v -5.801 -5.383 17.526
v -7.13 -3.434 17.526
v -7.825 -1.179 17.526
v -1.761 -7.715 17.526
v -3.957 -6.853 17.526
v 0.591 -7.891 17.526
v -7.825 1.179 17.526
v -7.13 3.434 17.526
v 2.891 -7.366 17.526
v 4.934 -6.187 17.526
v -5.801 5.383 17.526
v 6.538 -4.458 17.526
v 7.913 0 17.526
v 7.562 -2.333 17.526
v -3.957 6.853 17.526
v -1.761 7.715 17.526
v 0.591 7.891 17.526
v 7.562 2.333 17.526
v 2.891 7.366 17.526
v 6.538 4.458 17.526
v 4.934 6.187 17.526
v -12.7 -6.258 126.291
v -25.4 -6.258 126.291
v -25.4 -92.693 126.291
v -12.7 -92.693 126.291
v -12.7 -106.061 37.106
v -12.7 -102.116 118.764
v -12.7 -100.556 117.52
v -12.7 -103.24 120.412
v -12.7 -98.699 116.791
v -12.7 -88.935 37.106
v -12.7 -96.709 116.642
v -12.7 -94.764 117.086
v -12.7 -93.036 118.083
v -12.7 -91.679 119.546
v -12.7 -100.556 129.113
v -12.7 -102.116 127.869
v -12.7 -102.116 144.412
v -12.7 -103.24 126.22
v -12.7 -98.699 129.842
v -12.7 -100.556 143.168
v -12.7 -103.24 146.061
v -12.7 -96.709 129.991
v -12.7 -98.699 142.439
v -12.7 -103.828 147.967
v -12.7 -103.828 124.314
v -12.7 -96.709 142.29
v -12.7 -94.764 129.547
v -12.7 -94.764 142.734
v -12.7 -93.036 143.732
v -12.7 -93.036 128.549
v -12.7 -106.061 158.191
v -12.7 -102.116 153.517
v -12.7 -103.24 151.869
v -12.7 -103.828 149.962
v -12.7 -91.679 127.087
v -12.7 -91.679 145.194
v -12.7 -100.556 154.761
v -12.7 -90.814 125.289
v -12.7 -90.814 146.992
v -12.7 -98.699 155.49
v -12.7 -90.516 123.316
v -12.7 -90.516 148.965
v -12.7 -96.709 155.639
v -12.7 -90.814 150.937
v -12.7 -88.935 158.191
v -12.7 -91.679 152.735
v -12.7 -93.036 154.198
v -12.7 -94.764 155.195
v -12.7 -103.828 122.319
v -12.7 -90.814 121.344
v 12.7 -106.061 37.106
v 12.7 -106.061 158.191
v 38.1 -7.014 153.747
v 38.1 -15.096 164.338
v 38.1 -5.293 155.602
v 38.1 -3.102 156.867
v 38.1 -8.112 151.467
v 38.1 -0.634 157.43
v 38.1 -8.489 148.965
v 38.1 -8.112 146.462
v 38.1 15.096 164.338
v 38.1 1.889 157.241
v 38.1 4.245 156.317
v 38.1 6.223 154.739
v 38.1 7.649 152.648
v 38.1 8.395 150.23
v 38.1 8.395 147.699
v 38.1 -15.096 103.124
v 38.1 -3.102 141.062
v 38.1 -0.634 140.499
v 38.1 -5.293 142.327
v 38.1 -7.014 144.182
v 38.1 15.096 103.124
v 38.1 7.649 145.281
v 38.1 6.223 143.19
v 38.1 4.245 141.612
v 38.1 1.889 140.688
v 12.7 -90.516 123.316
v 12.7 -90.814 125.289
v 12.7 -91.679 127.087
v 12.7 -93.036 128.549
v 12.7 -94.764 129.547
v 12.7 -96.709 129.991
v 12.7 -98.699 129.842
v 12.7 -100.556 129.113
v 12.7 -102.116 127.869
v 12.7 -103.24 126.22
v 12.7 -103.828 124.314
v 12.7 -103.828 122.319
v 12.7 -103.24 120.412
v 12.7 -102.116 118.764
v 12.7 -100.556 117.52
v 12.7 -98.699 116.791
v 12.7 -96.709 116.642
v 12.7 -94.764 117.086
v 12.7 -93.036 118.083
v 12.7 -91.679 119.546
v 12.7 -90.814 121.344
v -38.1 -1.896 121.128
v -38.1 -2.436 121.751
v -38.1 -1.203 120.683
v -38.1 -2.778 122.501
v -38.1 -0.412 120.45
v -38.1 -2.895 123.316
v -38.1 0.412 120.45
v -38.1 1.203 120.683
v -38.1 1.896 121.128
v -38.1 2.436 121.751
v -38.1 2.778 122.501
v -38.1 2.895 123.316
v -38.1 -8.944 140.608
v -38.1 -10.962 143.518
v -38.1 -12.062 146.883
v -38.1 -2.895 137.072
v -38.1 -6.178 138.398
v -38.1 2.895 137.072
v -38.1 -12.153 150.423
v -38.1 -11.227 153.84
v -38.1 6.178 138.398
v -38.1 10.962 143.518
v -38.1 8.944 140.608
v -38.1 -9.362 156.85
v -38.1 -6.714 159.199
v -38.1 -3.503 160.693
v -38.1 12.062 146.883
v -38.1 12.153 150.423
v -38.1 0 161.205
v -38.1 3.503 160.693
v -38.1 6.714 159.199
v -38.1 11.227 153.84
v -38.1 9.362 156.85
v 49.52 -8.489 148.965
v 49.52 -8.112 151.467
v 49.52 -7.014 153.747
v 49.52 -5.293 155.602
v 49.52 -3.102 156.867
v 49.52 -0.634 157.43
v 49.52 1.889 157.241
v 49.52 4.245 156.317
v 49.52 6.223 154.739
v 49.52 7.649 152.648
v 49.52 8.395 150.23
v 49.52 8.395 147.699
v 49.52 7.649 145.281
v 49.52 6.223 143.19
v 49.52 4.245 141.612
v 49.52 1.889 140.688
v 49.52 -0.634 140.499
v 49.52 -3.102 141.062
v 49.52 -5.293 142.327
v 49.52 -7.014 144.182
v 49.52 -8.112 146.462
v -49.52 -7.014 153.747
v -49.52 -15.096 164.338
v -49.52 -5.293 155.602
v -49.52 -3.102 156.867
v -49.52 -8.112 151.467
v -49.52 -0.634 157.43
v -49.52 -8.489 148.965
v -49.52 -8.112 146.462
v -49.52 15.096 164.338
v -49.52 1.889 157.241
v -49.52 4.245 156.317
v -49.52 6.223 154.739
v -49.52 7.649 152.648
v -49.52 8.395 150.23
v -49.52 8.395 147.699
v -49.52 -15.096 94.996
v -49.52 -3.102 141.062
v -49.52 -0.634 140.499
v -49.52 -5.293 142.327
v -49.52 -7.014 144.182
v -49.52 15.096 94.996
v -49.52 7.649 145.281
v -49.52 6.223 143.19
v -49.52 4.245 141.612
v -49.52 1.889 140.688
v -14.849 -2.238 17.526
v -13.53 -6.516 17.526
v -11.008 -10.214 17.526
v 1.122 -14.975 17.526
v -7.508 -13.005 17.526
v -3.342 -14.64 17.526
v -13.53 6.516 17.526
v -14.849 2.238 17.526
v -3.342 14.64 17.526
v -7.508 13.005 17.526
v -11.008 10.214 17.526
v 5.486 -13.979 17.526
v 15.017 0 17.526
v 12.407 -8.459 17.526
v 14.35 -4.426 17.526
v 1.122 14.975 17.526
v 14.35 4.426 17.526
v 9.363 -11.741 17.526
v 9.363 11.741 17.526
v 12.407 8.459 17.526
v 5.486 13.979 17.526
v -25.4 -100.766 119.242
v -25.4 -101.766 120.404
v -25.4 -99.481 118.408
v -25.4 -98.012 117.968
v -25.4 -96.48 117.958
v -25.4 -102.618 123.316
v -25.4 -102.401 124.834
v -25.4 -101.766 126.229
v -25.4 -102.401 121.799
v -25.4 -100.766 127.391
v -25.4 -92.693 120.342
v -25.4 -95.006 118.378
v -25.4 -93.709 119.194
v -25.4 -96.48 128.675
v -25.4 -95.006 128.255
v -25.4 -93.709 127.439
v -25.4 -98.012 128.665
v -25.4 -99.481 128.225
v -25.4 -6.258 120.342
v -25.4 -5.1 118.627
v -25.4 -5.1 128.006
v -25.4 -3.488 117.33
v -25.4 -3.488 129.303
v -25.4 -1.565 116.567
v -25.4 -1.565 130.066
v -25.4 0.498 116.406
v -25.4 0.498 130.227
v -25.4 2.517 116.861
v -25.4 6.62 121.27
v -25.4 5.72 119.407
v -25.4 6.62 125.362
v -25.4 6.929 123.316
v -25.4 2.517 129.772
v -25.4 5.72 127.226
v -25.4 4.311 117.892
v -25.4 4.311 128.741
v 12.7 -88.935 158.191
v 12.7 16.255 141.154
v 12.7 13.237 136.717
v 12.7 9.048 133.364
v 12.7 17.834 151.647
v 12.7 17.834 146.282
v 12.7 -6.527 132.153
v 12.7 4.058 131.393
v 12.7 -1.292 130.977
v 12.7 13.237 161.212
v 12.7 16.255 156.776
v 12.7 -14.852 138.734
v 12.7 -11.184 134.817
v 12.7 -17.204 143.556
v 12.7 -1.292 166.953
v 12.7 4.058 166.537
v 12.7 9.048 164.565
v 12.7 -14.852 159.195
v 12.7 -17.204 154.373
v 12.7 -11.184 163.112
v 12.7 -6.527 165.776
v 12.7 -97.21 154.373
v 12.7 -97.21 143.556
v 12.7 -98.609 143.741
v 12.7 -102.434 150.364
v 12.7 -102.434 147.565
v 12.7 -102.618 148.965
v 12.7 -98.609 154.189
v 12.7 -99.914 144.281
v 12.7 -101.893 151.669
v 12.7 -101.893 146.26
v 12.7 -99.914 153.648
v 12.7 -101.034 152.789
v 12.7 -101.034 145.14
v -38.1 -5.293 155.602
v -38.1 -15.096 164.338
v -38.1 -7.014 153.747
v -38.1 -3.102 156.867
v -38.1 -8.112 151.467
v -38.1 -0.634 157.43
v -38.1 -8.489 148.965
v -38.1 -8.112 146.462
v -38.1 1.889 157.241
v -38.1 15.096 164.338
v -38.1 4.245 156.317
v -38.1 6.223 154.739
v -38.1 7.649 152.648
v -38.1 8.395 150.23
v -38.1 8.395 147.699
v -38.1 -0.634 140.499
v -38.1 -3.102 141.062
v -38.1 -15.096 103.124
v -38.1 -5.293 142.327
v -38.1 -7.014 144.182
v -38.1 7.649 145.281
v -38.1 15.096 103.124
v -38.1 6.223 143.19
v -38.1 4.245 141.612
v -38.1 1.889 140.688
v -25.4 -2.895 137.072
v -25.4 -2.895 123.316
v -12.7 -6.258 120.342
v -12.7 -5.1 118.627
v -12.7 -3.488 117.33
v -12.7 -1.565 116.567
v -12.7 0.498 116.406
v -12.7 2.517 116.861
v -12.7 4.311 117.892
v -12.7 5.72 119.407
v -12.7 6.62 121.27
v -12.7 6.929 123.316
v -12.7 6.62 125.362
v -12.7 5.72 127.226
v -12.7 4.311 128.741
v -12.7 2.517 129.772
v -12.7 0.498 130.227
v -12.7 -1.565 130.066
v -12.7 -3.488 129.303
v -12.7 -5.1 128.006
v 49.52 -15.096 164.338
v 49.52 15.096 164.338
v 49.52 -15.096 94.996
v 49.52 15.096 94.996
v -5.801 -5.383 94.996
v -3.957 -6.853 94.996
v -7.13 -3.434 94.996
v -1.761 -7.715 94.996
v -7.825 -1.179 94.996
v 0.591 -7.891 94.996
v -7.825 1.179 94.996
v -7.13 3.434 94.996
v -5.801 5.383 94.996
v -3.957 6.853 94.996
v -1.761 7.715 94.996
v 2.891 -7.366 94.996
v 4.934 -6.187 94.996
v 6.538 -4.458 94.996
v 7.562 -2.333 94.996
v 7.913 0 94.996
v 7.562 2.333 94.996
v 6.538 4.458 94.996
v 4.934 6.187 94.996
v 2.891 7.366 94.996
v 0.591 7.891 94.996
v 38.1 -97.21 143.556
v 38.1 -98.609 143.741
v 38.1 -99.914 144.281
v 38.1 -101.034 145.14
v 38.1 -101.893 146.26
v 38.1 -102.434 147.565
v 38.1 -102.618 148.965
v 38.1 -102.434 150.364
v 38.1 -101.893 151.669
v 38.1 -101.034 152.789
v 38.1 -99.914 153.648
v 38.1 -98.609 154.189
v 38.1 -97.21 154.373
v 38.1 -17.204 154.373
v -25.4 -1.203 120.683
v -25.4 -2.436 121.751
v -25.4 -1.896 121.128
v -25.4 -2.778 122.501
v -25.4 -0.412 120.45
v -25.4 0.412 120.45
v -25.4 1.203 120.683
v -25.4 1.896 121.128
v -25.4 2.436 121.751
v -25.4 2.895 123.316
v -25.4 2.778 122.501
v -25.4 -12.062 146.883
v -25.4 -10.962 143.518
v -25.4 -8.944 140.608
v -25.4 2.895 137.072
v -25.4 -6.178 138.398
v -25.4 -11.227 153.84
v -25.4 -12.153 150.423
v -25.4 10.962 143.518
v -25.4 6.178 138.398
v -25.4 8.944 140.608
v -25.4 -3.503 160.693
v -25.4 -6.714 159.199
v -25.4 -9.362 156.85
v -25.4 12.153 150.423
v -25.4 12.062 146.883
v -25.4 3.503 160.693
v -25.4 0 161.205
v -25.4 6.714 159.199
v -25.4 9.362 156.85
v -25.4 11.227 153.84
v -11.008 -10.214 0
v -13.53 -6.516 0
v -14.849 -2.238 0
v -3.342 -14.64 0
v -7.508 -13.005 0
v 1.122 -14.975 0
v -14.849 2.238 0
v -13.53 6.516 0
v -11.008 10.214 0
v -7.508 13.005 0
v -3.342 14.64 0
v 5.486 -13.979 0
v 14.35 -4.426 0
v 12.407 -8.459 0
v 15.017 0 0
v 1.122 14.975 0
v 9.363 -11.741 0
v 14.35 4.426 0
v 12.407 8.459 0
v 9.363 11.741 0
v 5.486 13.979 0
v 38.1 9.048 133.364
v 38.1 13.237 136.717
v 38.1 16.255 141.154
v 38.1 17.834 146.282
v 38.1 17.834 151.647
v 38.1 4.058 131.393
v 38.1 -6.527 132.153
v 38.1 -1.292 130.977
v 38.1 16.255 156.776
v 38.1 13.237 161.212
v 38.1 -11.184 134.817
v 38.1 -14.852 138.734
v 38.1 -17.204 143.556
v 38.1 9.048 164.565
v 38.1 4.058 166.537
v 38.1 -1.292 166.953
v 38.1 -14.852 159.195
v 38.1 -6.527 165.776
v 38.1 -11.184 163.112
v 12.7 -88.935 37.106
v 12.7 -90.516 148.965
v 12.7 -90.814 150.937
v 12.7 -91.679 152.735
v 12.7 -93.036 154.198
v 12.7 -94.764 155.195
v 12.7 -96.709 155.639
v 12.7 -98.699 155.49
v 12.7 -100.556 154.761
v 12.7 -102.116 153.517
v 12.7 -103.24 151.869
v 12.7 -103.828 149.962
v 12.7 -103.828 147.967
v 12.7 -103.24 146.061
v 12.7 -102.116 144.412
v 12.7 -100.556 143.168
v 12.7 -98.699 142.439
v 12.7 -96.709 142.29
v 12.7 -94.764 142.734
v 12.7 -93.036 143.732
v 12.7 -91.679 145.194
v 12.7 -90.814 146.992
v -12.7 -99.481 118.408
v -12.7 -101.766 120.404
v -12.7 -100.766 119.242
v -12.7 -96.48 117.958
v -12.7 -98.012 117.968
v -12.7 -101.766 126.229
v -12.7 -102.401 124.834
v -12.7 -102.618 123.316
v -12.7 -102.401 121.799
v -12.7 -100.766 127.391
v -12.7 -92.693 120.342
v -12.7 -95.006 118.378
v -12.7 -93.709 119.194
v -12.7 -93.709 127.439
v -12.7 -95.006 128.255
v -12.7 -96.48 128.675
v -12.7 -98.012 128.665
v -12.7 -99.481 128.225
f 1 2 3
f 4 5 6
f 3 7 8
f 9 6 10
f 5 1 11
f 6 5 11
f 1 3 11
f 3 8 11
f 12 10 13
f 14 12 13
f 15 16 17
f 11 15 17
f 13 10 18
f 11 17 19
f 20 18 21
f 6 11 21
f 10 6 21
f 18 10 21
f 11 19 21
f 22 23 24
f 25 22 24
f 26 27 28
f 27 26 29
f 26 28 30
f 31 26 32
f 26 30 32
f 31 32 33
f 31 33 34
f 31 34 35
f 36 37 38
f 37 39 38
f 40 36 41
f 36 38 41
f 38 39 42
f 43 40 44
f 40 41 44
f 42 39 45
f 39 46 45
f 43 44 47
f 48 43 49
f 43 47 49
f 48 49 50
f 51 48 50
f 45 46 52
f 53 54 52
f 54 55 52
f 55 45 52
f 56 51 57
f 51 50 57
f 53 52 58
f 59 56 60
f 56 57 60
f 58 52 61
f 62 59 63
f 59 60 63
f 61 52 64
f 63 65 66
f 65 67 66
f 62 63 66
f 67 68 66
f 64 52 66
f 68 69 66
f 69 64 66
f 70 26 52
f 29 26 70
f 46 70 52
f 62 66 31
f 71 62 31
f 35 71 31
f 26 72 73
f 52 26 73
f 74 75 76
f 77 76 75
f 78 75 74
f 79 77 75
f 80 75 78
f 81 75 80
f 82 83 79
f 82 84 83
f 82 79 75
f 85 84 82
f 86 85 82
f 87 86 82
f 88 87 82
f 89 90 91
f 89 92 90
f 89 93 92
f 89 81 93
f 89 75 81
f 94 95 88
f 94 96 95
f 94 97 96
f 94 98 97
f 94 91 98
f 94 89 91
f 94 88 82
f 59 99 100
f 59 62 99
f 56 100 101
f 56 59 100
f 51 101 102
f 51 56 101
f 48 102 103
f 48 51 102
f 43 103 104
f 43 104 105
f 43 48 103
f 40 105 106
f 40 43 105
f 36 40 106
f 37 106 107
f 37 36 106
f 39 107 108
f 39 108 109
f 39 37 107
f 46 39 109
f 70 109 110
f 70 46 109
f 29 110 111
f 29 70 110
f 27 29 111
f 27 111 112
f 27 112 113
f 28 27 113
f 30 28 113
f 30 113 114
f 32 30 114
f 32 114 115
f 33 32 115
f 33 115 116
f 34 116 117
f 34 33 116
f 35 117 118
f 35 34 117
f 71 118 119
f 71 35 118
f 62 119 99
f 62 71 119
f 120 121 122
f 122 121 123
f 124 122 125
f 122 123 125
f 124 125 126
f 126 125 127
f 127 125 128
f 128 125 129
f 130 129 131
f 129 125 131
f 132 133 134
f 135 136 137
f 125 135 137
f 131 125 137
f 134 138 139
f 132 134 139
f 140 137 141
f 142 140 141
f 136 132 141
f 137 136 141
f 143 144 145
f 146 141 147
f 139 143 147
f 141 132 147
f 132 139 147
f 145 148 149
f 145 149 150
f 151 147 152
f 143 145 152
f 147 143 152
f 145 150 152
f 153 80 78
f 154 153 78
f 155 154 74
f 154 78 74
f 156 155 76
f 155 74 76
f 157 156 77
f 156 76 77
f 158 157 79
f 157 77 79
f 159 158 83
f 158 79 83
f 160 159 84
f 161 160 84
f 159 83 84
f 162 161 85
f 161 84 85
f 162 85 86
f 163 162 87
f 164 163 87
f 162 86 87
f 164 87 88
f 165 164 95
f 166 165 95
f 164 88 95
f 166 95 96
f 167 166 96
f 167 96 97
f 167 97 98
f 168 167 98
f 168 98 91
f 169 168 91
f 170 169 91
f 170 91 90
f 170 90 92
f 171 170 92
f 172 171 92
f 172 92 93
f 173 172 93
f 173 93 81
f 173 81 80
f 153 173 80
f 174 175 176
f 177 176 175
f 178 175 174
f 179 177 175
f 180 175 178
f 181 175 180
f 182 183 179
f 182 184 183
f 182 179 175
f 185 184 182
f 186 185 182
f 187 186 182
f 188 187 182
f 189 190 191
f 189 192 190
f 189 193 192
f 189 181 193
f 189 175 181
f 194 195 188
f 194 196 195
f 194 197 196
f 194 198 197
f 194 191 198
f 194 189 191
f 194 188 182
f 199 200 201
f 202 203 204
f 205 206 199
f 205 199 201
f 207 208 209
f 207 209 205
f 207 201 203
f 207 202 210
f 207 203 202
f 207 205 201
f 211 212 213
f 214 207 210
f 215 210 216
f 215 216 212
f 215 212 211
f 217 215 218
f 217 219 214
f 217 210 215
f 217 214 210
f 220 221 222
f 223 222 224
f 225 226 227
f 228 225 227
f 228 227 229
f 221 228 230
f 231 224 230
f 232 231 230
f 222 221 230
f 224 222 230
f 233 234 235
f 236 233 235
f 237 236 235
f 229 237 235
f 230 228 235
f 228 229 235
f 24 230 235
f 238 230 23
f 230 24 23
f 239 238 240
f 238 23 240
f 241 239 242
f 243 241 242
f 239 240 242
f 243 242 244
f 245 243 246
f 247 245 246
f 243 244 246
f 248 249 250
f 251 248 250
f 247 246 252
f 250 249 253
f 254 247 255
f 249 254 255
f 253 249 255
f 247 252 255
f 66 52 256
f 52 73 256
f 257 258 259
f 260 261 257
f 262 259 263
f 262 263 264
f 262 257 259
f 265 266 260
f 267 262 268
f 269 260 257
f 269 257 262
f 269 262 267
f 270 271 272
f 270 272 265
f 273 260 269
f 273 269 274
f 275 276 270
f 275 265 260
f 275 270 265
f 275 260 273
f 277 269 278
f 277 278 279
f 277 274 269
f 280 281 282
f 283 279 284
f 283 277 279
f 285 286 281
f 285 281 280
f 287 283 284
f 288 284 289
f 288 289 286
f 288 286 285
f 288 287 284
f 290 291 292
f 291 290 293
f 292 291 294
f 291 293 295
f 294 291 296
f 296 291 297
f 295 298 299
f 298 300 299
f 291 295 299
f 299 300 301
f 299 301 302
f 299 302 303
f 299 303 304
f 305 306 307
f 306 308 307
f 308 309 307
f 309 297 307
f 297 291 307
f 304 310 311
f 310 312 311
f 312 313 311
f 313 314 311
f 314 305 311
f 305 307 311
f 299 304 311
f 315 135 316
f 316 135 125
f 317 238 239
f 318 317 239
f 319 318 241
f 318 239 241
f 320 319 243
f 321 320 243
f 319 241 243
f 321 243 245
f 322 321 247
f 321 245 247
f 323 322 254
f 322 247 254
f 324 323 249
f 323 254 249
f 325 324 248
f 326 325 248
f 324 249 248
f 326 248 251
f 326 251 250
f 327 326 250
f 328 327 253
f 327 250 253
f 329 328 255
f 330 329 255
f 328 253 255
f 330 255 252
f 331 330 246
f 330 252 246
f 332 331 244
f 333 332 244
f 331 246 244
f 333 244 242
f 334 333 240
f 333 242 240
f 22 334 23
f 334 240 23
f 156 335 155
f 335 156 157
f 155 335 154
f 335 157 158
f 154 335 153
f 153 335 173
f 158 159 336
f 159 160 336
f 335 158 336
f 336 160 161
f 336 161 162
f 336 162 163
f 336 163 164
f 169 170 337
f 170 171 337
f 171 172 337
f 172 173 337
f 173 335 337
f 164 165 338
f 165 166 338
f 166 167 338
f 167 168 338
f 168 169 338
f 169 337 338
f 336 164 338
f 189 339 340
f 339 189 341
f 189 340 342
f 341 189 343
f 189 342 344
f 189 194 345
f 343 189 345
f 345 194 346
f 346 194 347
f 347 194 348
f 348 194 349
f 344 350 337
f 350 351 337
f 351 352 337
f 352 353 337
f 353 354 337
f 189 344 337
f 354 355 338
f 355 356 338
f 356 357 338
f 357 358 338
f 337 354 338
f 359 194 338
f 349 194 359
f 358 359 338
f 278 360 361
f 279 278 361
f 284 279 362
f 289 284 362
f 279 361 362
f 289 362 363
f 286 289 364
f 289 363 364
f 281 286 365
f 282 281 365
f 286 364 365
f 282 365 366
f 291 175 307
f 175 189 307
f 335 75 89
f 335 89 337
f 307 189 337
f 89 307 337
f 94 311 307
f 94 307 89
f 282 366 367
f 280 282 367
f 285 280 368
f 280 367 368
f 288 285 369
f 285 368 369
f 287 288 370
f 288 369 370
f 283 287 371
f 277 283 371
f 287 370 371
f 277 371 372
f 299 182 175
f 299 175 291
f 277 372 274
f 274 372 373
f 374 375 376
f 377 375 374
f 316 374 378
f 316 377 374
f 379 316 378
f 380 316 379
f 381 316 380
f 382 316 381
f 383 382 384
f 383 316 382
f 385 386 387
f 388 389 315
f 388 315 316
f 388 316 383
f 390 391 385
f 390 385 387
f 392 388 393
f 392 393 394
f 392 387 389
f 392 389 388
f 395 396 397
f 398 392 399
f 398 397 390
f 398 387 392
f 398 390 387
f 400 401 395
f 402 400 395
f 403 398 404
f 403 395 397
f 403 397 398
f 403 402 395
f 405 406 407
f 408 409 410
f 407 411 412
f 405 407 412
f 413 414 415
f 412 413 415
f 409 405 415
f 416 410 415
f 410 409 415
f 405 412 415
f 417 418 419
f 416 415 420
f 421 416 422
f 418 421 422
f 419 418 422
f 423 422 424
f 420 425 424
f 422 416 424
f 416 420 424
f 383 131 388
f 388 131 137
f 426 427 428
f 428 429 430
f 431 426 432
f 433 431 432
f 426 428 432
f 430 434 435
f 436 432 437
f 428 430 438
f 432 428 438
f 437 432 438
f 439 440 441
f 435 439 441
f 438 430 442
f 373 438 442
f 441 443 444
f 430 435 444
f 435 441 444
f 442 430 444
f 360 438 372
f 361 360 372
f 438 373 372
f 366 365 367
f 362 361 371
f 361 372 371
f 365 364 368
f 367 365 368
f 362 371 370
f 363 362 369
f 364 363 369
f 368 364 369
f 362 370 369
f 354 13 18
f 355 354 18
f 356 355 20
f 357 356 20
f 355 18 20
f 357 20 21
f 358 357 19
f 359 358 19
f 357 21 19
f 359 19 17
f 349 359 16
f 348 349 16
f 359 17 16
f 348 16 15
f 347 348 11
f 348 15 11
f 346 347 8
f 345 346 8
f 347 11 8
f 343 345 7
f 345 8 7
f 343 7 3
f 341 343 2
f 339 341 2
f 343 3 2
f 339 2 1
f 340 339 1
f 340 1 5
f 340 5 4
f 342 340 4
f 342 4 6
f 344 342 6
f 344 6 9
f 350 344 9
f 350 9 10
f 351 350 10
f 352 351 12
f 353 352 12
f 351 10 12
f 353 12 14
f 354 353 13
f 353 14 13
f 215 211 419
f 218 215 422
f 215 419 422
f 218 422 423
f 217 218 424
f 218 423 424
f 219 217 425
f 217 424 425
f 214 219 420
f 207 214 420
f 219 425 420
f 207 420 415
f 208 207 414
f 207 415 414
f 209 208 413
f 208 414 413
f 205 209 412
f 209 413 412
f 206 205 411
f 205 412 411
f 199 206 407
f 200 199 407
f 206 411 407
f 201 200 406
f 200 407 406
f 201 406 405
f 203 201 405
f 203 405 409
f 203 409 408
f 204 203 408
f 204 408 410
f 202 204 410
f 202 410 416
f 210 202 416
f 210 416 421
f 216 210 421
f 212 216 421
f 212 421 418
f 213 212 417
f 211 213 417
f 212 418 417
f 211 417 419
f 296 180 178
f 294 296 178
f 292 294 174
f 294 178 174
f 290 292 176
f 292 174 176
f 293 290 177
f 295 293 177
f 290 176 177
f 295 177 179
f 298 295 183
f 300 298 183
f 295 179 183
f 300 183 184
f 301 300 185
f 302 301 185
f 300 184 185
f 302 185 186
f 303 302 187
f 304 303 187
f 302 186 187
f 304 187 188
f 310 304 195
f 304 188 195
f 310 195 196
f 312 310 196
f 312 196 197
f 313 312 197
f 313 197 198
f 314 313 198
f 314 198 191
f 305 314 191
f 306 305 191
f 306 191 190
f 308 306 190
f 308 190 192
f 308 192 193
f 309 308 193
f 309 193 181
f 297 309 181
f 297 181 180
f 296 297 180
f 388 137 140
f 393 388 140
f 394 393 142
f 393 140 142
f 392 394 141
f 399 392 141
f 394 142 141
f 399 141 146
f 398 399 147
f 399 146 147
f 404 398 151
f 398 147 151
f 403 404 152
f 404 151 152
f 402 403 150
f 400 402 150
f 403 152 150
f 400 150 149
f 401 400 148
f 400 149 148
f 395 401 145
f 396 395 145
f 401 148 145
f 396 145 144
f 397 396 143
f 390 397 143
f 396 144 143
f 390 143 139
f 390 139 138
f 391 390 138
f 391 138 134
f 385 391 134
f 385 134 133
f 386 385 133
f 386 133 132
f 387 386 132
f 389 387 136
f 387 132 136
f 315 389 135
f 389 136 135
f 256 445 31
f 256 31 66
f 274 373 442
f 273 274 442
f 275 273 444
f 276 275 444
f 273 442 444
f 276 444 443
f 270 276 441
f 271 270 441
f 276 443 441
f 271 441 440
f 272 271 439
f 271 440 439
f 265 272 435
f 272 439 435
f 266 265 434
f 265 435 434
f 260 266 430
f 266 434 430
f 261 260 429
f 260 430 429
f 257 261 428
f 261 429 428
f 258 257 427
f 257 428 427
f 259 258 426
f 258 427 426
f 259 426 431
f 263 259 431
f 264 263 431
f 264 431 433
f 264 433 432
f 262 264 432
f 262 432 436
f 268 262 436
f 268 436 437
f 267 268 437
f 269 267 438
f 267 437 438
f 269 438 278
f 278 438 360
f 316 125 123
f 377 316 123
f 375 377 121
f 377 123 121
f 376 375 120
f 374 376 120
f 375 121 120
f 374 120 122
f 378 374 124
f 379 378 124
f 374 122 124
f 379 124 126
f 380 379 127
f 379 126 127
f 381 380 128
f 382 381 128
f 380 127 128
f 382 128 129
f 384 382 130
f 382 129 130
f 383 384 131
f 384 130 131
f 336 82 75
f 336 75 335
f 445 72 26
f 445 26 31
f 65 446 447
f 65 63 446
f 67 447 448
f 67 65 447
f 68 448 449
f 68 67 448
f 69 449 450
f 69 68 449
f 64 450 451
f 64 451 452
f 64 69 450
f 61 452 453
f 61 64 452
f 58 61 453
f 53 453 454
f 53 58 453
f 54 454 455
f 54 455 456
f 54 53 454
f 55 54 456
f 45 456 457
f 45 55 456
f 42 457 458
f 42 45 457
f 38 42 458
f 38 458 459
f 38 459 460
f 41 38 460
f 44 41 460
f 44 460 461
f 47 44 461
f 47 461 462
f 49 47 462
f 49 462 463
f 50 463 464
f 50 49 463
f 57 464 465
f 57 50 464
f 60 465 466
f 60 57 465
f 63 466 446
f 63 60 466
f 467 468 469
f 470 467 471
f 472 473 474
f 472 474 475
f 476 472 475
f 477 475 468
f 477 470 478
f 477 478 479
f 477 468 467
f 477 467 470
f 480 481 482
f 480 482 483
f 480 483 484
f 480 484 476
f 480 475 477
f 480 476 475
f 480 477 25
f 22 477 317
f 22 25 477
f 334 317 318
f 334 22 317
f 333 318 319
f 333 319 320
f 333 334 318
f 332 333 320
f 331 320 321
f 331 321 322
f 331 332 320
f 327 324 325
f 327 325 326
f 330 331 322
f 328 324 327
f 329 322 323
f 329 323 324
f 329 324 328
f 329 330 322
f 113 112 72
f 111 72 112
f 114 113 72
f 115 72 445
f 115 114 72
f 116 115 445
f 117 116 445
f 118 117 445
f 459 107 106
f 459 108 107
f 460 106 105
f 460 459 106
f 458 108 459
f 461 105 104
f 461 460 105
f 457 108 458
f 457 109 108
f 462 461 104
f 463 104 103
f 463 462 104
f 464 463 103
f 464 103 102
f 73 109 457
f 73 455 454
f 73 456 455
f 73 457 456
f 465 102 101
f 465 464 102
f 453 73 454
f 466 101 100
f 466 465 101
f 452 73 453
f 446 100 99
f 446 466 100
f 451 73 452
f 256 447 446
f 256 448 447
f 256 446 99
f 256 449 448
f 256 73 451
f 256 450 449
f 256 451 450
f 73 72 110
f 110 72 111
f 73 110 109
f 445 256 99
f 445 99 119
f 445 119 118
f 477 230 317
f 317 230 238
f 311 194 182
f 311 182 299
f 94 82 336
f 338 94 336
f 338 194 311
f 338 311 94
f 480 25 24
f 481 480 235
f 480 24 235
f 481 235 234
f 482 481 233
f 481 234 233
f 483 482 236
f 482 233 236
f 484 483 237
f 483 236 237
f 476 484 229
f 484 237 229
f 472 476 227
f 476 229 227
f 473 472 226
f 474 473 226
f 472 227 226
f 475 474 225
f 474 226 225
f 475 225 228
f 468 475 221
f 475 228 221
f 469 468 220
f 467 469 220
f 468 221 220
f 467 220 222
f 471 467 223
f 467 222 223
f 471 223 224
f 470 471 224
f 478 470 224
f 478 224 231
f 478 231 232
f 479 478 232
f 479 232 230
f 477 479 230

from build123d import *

# Parameters (mm, degrees)
F0_R      = 15.0168391693
F1_DEPTH  = 17.526
F2_R      = 7.913434423
F3_DEPTH  = 77.47
F4_W      = 99.0400761366
F4_H      = 30.1920697093
F5_DEPTH  = 8.128
F6_W      = 11.4200380683
F6_H      = 30.1920697093
F7_DEPTH  = 61.214
F8_R      = 8.4894563365
F9_DEPTH  = 99.0410761366
F11_DEPTH = 12.7
F13_DEPTH = 25.4
F15_DEPTH = 12.7
F16_W     = 17.1260535717
F16_H     = 121.084202081
F16_R     = 6.6931862807
F17_DEPTH = 12.7


with BuildPart() as f1:
    # F0 (on Top) → F1 (new body)
    with BuildSketch(Plane.XY):
        Circle(F0_R)
    extrude(amount=F1_DEPTH)


with BuildPart() as f3:
    # F2 (on face) → F3 (new body)
    with BuildSketch(Plane.XY.offset(17.526)):
        Circle(F2_R)
    extrude(amount=F3_DEPTH)

    # F4 (on face) → F5 (join)
    with BuildSketch(Plane.XY.offset(94.996)):
        Rectangle(F4_W, F4_H)
    extrude(amount=F5_DEPTH)

    # F6 (on face) → F7 (join)
    with BuildSketch(Plane.XY.offset(103.124)):
        with Locations((-43.8100190341, 0)):
            Rectangle(F6_W, F6_H)
        with Locations((43.8100190341, 0)):
            Rectangle(F6_W, F6_H)
    extrude(amount=F7_DEPTH)

    # F8 (on face) → F9 (cut, through all)
    with BuildSketch(Plane(origin=(-49.5200380683, 0, 0), x_dir=(0, -1, 0), z_dir=(-1, 0, 0))):
        with Locations((0, 148.9645689726)):
            Circle(F8_R)
    extrude(amount=-F9_DEPTH, mode=Mode.SUBTRACT)


with BuildPart() as f11:
    # F10 (on face) → F11 (new body)
    with BuildSketch(Plane.YZ.offset(-38.1)):
        with BuildLine():
            ThreePointArc((2.8954122681, 137.0715770523), (9.6246451316, 141.4019718585), (12.2403704609, 148.9645689726))
            ThreePointArc((12.2403704609, 148.9645689726), (-7.5625971141, 158.5892141042), (-2.8954122681, 137.0715770523))
            Line((-2.8954122681, 137.0715770523), (-2.8954122681, 157.6338106179))
            Line((-2.8954122681, 157.6338106179), (2.8954122681, 157.6338106179))
            Line((2.8954122681, 157.6338106179), (2.8954122681, 137.0715770523))
        make_face()
        with BuildLine():
            Line((-2.8954122681, 157.6338106179), (-2.8954122681, 137.0715770523))
            ThreePointArc((-2.8954122681, 137.0715770523), (0, 136.7241985117), (2.8954122681, 137.0715770523))
            Line((2.8954122681, 137.0715770523), (2.8954122681, 157.6338106179))
            Line((2.8954122681, 157.6338106179), (-2.8954122681, 157.6338106179))
        make_face()
        with BuildLine():
            ThreePointArc((2.8954122681, 137.0715770523), (0, 136.7241985117), (-2.8954122681, 137.0715770523))
            Line((-2.8954122681, 137.0715770523), (-2.8954122681, 123.3164146543))
            ThreePointArc((-2.8954122681, 123.3164146543), (0, 126.2118269224), (2.8954122681, 123.3164146543))
            Line((2.8954122681, 123.3164146543), (2.8954122681, 137.0715770523))
        make_face()
        with BuildLine():
            ThreePointArc((2.8954122681, 123.3164146543), (0, 126.2118269224), (-2.8954122681, 123.3164146543))
            Line((-2.8954122681, 123.3164146543), (2.8954122681, 123.3164146543))
        make_face()
        with BuildLine():
            Line((2.8954122681, 123.3164146543), (-2.8954122681, 123.3164146543))
            ThreePointArc((-2.8954122681, 123.3164146543), (0, 120.4210023861), (2.8954122681, 123.3164146543))
        make_face()
    extrude(amount=F11_DEPTH)


with BuildPart() as f13:
    # F12 (on face) → F13 (new body)
    with BuildSketch(Plane(origin=(38.1, 0, 0), x_dir=(0, -1, 0), z_dir=(-1, 0, 0))):
        with BuildLine():
            ThreePointArc((17.2043421821, 143.5563415289), (17.8256514212, 146.2287938703), (18.0343648072, 148.9645689726))
            ThreePointArc((18.0343648072, 148.9645689726), (17.8256514212, 151.7003440749), (17.2043421821, 154.3727964163))
            Line((17.2043421821, 154.3727964163), (-4.04444821, 154.3727964163))
            Line((-4.04444821, 154.3727964163), (-4.04444821, 143.5563415289))
            Line((-4.04444821, 143.5563415289), (17.2043421821, 143.5563415289))
        make_face()
        with BuildLine():
            ThreePointArc((17.2043421821, 154.3727964163), (17.8256514212, 151.7003440749), (18.0343648072, 148.9645689726))
            ThreePointArc((18.0343648072, 148.9645689726), (17.8256514212, 146.2287938703), (17.2043421821, 143.5563415289))
            Line((17.2043421821, 143.5563415289), (97.2095828522, 143.5563415289))
            ThreePointArc((97.2095828522, 143.5563415289), (91.8013554085, 148.9645689726), (97.2095828522, 154.3727964163))
            Line((97.2095828522, 154.3727964163), (17.2043421821, 154.3727964163))
        make_face()
        with BuildLine():
            Line((-4.04444821, 154.3727964163), (17.2043421821, 154.3727964163))
            ThreePointArc((17.2043421821, 154.3727964163), (-18.0343648072, 148.9645689726), (17.2043421821, 143.5563415289))
            Line((17.2043421821, 143.5563415289), (-4.04444821, 143.5563415289))
            Line((-4.04444821, 143.5563415289), (-4.04444821, 154.3727964163))
        make_face()
        with BuildLine():
            ThreePointArc((102.6178102959, 148.9645689726), (101.0337771518, 152.7887632722), (97.2095828522, 154.3727964163))
            Line((97.2095828522, 154.3727964163), (97.2095828522, 143.5563415289))
            ThreePointArc((97.2095828522, 143.5563415289), (101.0337771518, 145.140374673), (102.6178102959, 148.9645689726))
        make_face()
        with BuildLine():
            Line((97.2095828522, 143.5563415289), (97.2095828522, 154.3727964163))
            ThreePointArc((97.2095828522, 154.3727964163), (91.8013554085, 148.9645689726), (97.2095828522, 143.5563415289))
        make_face()
    extrude(amount=F13_DEPTH)


with BuildPart() as f15:
    # F14 (on face) → F15 (new body)
    with BuildSketch(Plane.YZ.offset(-25.4)):
        with BuildLine():
            ThreePointArc((-6.2575824752, 120.3420385718), (1.5245537782, 116.557717495), (6.92851005, 123.3164146543))
            ThreePointArc((6.92851005, 123.3164146543), (1.5245537782, 130.0751118135), (-6.2575824752, 126.2907907367))
            Line((-6.2575824752, 126.2907907367), (0, 126.2907907367))
            Line((0, 126.2907907367), (0, 120.3420385718))
            Line((0, 120.3420385718), (-6.2575824752, 120.3420385718))
        make_face()
        with BuildLine():
            Line((0, 126.2907907367), (-6.2575824752, 126.2907907367))
            ThreePointArc((-6.2575824752, 126.2907907367), (-6.92851005, 123.3164146543), (-6.2575824752, 120.3420385718))
            Line((-6.2575824752, 120.3420385718), (0, 120.3420385718))
            Line((0, 120.3420385718), (0, 126.2907907367))
        make_face()
        with BuildLine():
            ThreePointArc((-6.2575824752, 120.3420385718), (-6.92851005, 123.3164146543), (-6.2575824752, 126.2907907367))
            Line((-6.2575824752, 126.2907907367), (-92.6927243196, 126.2907907367))
            ThreePointArc((-92.6927243196, 126.2907907367), (-92.0289881779, 124.8689490029), (-91.8013554085, 123.3164146543))
            ThreePointArc((-91.8013554085, 123.3164146543), (-92.0289881779, 121.7638803056), (-92.6927243196, 120.3420385718))
            Line((-92.6927243196, 120.3420385718), (-6.2575824752, 120.3420385718))
        make_face()
        with BuildLine():
            Line((-97.2095828522, 126.2907907367), (-92.6927243196, 126.2907907367))
            ThreePointArc((-92.6927243196, 126.2907907367), (-102.6178102959, 123.3164146543), (-92.6927243196, 120.3420385718))
            Line((-92.6927243196, 120.3420385718), (-97.2095828522, 120.3420385718))
            Line((-97.2095828522, 120.3420385718), (-97.2095828522, 126.2907907367))
        make_face()
        with BuildLine():
            ThreePointArc((-91.8013554085, 123.3164146543), (-92.0289881779, 124.8689490029), (-92.6927243196, 126.2907907367))
            Line((-92.6927243196, 126.2907907367), (-97.2095828522, 126.2907907367))
            Line((-97.2095828522, 126.2907907367), (-97.2095828522, 120.3420385718))
            Line((-97.2095828522, 120.3420385718), (-92.6927243196, 120.3420385718))
            ThreePointArc((-92.6927243196, 120.3420385718), (-92.0289881779, 121.7638803056), (-91.8013554085, 123.3164146543))
        make_face()
    extrude(amount=F15_DEPTH)


with BuildPart() as f17:
    # F16 (on Right) → F17 (new body, symmetric)
    with BuildSketch(Plane.YZ):
        with Locations((-97.4983200431, 97.6485516876)):
            Rectangle(F16_W, F16_H)
        with Locations((-97.2095828522, 123.3164146543)):
            Circle(F16_R, mode=Mode.SUBTRACT)
        with Locations((-97.2095828522, 148.9645689726)):
            Circle(F16_R, mode=Mode.SUBTRACT)
    extrude(amount=F17_DEPTH, both=True)


solid = Compound([f1.part, f3.part, f11.part, f13.part, f15.part, f17.part])
